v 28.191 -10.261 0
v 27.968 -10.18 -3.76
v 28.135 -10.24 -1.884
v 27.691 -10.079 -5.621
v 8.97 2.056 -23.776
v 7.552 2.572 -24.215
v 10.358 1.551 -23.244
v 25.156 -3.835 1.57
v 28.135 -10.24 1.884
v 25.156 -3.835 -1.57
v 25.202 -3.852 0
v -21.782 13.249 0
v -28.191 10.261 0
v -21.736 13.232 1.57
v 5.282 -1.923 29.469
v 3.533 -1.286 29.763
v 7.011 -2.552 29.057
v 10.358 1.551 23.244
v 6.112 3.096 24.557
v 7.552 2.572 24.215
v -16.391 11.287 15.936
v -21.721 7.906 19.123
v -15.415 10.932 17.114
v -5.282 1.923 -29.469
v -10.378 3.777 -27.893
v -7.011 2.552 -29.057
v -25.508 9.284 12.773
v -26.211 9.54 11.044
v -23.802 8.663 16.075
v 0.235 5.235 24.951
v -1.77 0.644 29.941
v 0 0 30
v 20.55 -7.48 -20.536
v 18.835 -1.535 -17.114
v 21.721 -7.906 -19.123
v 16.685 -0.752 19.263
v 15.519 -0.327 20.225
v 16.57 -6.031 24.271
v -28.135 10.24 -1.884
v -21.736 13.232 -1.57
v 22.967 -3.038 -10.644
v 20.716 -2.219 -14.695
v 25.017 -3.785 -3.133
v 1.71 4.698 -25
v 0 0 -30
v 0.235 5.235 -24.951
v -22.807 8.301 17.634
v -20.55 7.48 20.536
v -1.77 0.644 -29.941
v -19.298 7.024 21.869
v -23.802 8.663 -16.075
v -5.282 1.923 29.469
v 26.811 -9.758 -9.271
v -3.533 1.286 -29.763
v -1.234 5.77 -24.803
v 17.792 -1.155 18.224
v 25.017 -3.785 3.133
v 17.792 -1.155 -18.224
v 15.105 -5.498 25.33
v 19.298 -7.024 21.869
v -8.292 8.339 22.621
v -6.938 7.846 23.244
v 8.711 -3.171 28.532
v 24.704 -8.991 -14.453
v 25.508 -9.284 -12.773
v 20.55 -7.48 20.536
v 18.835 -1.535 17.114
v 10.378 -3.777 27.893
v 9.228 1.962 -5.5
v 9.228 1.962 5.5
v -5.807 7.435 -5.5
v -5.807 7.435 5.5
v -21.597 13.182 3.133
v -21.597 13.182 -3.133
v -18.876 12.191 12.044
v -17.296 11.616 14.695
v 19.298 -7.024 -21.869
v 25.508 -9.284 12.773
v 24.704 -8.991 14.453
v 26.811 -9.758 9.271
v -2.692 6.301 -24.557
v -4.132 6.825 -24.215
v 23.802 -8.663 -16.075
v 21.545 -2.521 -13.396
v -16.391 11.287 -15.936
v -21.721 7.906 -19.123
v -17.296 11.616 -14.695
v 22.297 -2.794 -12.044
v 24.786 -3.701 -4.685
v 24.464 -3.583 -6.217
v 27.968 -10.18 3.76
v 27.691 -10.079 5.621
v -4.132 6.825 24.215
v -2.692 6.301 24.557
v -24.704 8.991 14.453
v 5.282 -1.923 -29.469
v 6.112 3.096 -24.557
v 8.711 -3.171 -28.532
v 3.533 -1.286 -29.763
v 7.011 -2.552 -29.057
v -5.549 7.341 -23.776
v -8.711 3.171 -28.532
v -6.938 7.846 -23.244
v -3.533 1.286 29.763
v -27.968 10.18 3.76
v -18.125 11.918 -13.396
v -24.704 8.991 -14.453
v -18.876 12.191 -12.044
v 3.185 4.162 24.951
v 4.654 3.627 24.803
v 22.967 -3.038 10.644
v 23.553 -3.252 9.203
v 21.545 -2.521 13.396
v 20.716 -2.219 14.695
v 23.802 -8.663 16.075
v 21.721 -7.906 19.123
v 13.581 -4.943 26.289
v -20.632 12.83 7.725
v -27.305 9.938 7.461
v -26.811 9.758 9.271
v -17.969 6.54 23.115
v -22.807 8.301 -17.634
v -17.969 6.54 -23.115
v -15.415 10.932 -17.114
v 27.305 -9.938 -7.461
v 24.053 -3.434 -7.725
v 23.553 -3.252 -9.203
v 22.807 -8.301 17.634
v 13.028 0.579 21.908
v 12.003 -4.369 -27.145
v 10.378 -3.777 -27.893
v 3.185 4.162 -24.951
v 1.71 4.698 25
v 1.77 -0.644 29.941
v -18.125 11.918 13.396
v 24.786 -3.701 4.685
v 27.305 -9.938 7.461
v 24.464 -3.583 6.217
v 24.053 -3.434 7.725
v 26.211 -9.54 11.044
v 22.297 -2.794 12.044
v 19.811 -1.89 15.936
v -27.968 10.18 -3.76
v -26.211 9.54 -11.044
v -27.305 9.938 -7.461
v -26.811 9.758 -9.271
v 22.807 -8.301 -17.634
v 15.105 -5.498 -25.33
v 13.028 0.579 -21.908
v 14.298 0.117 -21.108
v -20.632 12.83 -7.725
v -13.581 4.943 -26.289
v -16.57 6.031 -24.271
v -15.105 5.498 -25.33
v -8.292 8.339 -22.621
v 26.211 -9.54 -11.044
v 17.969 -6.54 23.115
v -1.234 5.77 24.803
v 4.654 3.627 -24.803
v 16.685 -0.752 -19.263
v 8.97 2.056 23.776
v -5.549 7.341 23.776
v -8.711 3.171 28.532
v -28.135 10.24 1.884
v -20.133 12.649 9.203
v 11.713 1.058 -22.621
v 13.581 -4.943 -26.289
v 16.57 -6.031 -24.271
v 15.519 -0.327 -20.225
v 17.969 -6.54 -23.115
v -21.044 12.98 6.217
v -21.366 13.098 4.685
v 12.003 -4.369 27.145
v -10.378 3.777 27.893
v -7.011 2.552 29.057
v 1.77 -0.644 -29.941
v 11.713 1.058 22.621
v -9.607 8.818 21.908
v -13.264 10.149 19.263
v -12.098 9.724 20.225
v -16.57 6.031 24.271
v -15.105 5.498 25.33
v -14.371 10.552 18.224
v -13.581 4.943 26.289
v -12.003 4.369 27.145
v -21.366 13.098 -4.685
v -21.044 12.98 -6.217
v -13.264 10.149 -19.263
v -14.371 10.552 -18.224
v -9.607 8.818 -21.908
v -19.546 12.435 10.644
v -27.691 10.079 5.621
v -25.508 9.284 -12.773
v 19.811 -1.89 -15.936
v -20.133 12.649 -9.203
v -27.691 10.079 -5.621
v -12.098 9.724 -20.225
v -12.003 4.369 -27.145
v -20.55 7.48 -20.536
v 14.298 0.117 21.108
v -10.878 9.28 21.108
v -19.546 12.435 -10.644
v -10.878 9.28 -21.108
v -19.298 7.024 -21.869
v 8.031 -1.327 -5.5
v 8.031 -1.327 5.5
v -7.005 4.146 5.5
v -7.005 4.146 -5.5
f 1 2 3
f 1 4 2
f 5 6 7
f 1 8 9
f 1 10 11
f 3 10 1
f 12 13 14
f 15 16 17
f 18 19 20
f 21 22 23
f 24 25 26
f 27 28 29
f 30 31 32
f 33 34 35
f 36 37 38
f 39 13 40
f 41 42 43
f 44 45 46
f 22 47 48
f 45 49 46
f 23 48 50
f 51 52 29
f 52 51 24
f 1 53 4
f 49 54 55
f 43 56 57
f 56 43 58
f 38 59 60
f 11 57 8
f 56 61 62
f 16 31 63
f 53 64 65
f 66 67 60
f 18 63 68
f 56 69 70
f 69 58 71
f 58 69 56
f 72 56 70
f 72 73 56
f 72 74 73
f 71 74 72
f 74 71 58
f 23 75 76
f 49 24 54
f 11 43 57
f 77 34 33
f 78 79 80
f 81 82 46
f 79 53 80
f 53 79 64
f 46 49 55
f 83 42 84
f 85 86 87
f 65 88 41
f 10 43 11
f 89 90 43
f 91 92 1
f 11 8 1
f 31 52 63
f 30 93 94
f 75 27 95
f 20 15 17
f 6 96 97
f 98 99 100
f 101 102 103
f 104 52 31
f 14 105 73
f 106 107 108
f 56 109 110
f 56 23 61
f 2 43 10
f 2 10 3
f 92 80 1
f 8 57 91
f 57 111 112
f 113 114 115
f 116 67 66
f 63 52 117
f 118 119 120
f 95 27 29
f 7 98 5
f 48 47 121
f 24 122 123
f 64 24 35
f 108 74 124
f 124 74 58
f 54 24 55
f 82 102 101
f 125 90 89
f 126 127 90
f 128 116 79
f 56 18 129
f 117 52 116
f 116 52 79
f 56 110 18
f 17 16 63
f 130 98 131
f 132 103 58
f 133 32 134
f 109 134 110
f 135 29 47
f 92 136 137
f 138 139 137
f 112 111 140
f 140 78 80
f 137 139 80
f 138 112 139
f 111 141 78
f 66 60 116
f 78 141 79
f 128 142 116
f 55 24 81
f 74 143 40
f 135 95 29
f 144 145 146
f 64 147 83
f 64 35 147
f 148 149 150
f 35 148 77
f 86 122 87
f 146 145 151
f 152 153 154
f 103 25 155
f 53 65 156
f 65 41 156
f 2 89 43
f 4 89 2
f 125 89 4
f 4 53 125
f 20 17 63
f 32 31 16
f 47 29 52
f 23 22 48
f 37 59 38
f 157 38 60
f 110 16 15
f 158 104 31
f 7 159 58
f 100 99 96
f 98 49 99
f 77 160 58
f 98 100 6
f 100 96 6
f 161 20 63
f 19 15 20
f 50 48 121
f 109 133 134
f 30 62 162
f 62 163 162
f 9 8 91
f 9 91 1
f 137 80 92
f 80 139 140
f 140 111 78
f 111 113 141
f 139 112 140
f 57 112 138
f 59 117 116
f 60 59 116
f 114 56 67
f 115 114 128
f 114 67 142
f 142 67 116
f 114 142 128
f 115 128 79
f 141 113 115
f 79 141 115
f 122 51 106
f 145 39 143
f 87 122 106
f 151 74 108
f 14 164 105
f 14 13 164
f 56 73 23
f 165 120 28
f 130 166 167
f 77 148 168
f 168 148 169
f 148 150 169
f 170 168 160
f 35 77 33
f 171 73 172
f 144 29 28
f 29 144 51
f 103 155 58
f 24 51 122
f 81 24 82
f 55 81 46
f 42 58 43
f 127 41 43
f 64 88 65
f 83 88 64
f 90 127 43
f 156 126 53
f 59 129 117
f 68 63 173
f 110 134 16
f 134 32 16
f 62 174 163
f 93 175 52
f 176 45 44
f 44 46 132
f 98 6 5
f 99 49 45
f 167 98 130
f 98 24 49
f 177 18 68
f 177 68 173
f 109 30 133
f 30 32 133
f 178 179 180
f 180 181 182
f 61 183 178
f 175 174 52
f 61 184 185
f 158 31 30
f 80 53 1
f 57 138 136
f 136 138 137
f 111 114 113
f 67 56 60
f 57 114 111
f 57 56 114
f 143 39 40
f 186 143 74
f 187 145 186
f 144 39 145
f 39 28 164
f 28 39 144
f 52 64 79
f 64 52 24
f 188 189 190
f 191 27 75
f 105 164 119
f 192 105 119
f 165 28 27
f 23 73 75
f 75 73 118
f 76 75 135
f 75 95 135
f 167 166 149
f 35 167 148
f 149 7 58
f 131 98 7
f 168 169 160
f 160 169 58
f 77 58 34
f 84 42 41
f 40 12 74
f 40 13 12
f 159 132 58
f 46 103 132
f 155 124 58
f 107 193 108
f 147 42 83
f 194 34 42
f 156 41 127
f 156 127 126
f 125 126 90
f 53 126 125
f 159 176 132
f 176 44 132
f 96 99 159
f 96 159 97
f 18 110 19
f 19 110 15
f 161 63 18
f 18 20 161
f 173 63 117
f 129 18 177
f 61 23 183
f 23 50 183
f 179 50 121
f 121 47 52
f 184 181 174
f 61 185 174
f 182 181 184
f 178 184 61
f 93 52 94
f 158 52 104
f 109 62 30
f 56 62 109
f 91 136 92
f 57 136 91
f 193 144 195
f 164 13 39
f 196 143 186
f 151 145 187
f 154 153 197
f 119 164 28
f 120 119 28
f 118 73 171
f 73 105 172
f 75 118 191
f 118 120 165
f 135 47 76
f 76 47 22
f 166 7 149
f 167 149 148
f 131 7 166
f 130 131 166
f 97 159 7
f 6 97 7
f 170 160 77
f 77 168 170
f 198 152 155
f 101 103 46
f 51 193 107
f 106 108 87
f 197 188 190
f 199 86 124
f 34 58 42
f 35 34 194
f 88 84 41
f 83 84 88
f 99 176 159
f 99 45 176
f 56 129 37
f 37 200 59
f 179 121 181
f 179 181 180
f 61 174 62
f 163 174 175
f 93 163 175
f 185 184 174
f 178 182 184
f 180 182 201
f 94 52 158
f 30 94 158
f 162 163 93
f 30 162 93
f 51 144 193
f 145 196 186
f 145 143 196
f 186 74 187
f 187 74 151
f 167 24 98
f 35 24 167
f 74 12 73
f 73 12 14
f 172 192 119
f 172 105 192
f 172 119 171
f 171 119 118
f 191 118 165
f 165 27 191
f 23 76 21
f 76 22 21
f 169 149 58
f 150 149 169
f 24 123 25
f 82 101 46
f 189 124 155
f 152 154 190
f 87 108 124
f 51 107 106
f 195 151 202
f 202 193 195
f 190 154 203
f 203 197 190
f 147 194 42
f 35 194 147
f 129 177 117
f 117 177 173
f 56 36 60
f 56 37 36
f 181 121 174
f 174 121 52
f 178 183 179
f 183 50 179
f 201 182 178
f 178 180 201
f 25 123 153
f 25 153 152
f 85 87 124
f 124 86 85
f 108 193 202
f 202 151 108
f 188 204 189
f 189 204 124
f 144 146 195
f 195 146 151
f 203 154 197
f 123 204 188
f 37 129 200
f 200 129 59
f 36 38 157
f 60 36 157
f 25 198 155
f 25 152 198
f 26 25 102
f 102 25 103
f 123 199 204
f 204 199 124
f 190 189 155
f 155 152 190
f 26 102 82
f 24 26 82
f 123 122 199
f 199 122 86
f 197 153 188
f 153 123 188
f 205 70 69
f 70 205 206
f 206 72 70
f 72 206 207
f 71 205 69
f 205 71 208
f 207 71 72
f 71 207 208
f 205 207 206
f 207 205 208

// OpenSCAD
/*linear_extrude(height = 10, center = true, convexity = 10, twist = 0)
difference() {
circle(d=115);
circle(d=90);
translate([10, -120, 0]) square(250); 
}
*/
$fn = 100;
difference() {
rotate([-90,0,-20]) translate([0,0,0]) cylinder(5,30,25); 
rotate([0,0,-20]) translate([0,12,0]) cube([16,21,11,],true);

}
